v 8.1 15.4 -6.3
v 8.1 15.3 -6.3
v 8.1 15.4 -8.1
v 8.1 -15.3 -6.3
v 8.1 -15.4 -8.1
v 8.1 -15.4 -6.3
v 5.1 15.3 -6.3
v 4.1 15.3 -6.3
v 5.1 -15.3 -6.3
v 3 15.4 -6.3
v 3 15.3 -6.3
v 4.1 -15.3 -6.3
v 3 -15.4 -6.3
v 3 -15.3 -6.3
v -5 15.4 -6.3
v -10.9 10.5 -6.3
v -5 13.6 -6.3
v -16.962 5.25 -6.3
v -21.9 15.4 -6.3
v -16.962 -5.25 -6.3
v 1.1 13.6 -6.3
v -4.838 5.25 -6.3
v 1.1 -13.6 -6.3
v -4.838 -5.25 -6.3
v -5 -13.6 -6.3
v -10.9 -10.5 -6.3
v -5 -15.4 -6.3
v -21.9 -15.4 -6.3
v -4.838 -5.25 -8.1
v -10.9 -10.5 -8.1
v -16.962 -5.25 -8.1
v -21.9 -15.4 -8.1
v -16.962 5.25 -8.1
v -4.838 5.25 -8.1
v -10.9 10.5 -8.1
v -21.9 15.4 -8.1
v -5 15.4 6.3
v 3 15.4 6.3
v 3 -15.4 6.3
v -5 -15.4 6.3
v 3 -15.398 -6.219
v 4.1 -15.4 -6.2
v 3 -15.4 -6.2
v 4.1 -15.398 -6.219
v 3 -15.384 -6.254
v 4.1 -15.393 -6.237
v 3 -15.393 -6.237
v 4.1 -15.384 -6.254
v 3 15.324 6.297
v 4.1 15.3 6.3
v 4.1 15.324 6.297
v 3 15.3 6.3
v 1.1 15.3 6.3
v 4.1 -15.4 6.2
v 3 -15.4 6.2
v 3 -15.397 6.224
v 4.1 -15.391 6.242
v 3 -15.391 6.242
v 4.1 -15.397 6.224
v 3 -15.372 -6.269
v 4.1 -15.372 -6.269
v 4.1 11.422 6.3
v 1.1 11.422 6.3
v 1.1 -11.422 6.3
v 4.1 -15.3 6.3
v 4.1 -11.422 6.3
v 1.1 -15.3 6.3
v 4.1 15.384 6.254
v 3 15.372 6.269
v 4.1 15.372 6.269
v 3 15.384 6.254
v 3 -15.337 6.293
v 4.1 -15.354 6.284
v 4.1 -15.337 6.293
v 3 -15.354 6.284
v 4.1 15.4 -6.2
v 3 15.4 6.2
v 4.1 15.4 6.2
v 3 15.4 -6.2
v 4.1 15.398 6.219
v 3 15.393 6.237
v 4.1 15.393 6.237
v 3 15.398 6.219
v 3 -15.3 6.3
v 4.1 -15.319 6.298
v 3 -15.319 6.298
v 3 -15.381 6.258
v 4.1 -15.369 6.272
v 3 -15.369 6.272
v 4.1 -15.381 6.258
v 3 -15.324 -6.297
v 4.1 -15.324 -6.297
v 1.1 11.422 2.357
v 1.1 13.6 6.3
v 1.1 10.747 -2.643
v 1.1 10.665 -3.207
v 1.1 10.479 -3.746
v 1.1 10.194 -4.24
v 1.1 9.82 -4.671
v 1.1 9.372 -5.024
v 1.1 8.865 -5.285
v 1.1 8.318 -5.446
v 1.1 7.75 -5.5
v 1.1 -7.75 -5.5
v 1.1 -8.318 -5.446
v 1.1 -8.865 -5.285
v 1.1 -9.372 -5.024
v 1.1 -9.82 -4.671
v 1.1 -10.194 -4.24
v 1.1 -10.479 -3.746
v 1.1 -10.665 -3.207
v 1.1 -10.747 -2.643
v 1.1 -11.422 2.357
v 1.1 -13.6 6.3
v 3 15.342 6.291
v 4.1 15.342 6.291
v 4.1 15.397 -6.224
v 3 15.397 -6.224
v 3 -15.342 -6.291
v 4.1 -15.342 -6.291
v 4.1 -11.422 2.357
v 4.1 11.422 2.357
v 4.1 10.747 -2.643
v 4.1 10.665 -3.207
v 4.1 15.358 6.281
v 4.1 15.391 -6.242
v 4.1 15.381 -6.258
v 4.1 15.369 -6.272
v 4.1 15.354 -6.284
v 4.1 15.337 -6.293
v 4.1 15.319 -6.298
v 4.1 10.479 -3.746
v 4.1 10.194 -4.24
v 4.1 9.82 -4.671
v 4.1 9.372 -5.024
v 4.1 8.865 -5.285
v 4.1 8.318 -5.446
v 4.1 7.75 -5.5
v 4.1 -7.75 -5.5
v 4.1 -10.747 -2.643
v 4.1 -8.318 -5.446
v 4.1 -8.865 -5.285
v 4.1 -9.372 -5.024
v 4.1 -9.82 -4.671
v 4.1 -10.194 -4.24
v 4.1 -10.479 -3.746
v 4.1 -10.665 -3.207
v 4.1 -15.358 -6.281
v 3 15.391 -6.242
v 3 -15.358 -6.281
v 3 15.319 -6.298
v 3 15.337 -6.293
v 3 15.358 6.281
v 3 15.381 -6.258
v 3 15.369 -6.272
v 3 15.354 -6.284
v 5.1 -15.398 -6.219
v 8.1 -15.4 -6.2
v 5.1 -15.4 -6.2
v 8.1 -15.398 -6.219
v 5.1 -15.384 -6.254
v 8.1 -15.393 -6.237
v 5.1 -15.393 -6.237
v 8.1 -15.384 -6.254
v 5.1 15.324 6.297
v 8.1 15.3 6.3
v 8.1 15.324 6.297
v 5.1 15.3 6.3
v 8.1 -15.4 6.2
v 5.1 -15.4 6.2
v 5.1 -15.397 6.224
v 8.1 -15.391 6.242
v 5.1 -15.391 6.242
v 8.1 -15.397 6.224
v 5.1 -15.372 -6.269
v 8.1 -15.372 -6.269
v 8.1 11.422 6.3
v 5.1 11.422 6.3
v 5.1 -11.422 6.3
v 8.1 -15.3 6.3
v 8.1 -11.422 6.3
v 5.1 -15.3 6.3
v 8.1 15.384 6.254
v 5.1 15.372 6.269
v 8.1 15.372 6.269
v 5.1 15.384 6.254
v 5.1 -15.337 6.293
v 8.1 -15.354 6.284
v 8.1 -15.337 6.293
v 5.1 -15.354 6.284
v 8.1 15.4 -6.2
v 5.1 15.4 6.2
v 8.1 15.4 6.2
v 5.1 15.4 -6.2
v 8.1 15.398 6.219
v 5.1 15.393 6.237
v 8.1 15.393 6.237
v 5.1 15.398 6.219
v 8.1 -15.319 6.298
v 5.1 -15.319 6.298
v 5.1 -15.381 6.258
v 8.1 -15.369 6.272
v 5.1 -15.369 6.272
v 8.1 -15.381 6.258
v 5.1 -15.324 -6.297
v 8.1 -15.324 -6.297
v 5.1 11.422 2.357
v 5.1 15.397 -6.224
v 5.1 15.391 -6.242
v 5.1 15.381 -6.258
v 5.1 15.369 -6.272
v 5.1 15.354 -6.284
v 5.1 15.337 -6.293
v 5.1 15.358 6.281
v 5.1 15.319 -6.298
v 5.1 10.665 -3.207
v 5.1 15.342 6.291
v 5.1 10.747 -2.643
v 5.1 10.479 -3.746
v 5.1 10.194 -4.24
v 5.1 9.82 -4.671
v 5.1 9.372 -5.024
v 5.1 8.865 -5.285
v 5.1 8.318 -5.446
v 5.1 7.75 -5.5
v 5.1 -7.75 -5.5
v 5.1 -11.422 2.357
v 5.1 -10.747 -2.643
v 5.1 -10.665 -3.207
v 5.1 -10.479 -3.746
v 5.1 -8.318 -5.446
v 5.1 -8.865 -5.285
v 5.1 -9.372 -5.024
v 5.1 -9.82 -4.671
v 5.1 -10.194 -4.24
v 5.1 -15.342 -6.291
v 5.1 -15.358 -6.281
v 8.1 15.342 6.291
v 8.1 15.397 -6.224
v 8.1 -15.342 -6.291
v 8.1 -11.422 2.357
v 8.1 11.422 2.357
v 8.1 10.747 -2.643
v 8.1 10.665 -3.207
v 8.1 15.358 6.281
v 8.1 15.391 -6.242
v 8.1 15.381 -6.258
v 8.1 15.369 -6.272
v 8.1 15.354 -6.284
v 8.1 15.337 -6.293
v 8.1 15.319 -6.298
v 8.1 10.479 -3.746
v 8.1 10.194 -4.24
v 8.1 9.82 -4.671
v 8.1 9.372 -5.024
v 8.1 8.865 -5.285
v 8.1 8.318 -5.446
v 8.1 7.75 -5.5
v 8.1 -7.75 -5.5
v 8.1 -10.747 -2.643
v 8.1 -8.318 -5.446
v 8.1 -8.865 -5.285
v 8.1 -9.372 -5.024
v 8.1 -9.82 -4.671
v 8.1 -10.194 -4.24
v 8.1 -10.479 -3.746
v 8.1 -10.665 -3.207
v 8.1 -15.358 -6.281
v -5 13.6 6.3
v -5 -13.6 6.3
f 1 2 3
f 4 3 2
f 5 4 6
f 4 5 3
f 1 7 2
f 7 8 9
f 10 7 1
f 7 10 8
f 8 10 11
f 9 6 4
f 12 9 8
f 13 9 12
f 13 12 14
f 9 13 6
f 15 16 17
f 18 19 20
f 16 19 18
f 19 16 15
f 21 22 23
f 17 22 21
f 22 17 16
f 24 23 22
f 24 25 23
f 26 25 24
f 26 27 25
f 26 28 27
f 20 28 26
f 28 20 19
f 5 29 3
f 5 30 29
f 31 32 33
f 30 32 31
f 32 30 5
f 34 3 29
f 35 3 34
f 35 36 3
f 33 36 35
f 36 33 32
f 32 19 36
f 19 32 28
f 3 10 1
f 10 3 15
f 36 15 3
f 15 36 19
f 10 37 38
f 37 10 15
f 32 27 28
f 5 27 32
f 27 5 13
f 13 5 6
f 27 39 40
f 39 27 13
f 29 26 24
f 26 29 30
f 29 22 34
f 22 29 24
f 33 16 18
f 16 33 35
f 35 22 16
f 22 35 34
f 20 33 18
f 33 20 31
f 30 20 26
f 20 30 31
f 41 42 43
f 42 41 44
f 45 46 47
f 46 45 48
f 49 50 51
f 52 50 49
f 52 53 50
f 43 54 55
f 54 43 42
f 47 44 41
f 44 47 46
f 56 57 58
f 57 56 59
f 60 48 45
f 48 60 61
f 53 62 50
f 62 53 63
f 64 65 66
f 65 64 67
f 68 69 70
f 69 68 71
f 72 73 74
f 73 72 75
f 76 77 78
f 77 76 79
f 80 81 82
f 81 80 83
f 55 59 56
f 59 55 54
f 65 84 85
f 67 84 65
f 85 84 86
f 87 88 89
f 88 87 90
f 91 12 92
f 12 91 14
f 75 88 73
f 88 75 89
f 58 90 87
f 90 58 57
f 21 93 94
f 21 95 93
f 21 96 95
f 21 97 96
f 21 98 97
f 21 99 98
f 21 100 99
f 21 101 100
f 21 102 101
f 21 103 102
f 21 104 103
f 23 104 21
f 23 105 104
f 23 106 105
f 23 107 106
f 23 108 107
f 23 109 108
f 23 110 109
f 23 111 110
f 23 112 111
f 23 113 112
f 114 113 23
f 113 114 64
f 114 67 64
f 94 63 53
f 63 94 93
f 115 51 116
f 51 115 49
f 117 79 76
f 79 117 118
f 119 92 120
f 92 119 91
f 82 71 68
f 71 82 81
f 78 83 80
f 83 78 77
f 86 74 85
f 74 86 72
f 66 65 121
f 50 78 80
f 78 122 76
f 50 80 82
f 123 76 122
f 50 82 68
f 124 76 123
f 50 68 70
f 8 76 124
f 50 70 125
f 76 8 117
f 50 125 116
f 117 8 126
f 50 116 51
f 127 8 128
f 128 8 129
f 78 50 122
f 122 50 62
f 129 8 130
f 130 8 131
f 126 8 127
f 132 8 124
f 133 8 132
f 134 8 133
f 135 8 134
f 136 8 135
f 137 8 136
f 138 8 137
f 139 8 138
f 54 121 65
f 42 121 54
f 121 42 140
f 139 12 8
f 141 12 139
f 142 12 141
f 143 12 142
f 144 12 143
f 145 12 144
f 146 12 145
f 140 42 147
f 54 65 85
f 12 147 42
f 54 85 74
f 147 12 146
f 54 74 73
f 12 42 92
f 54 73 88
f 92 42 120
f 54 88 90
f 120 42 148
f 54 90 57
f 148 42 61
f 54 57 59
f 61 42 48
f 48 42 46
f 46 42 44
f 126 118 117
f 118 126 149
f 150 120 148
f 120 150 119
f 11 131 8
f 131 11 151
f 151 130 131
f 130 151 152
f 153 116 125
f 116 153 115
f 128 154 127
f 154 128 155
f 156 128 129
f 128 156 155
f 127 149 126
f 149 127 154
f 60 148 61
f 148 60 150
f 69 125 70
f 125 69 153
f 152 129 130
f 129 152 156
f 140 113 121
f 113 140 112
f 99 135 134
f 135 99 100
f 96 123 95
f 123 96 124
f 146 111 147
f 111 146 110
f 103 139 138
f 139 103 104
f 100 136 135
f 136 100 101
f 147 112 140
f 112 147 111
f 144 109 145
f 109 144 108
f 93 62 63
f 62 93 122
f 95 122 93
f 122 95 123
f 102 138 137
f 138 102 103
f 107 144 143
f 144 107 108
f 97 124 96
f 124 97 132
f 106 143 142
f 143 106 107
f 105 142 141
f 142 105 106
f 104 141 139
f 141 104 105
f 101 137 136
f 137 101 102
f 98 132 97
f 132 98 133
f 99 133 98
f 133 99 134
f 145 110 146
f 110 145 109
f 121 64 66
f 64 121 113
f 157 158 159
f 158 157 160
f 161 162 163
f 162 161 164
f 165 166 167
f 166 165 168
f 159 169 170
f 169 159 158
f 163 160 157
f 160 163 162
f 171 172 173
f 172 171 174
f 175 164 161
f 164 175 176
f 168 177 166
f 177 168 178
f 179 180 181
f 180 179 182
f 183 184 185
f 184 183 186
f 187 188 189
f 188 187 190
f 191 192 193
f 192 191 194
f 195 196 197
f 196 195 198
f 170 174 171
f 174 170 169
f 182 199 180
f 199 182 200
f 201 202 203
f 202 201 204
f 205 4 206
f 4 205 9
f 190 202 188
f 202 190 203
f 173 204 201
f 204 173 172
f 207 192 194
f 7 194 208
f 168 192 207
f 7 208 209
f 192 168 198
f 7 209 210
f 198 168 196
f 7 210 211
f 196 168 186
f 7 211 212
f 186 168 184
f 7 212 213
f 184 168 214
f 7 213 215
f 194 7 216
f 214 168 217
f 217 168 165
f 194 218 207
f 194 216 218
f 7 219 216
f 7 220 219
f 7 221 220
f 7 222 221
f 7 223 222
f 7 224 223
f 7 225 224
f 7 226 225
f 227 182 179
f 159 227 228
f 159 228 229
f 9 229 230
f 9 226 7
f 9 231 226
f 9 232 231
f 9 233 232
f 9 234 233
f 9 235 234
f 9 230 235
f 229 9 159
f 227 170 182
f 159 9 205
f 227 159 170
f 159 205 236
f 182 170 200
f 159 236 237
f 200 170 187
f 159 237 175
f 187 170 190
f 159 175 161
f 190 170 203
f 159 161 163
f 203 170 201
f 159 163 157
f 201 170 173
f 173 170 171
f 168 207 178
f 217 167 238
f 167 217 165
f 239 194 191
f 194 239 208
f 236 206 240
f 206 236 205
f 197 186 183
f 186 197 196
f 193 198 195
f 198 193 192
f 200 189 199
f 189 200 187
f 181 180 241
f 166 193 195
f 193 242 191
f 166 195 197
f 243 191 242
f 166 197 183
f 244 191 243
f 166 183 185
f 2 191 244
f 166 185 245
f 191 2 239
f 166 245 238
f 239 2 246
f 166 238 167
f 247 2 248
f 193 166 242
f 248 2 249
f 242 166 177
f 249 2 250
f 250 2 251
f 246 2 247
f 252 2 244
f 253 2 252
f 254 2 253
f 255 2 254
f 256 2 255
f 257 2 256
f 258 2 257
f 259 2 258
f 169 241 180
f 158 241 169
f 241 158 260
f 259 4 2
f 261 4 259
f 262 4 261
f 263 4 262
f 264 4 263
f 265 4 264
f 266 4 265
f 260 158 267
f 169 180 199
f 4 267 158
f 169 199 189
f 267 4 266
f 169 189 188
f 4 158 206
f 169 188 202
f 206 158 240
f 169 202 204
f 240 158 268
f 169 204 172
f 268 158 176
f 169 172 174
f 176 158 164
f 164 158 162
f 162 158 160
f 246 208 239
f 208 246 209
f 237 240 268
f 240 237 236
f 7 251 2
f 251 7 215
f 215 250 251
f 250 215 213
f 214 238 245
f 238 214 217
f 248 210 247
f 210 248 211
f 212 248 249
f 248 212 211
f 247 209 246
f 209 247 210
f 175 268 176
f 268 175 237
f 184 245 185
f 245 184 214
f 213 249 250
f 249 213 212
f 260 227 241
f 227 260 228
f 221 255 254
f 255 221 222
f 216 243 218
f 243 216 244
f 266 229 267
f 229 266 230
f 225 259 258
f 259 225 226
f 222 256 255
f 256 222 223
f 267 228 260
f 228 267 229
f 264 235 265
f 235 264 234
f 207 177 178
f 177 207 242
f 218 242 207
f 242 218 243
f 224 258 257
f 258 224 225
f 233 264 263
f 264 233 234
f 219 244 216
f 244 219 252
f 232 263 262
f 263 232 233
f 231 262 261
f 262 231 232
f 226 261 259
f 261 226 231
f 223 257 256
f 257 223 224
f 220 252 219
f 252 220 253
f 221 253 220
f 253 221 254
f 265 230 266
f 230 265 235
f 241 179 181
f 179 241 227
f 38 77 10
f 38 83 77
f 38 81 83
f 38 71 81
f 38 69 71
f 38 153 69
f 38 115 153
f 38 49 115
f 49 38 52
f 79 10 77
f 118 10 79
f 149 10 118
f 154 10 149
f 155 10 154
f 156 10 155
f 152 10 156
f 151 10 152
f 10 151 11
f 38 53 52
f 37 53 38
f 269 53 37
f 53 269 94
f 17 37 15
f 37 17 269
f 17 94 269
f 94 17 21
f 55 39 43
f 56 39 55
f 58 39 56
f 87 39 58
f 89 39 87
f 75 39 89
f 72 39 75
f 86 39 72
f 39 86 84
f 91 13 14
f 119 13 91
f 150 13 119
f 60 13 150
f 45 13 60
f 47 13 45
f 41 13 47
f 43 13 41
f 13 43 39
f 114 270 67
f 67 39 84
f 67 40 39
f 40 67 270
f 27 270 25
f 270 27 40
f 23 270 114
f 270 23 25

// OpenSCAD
// file: rounder.scad
// rounder.scad
// cutting tool for rounding off corners with a cylinder

//---------------------
module rounder(
r=10,   // radius
h=10,   // height
f=22,    // $fn
extra=0.01  // extra size for the cube
){

difference(){
  translate([-extra,-extra,-extra])
  cube([r+extra,r+extra,h+2*extra]);
  translate([r,r,-1])
  cylinder(r=r,h=h+2,$fn=f);
}

}

//---------------------------------------------------------------------------
module bevel(x=1,y=1,h=10){

linear_extrude(height=h)
polygon(points=[[0,0],[x,0],[0,y]]);
    
}
  

//========================

rounder();

//========================
// main file
//=================================================================================
// db9.scad
//
// Dr Tom Flint, 22 Oct 2023
//=================================================================================


use <../Parts/rounder.scad>
use <../Parts/threads.scad>

F1=33;

//----------------------------------------------------------------------------------
module dbplate(tol=0){
r1=1;
y1=25.3/2;

  difference(){
    linear_extrude(height=1+tol)  
    offset(r=r1,$fn=F1)
    square([12.6-2*r1,30.8-2*r1],center=true);

    if(tol==0){
      translate([0,y1,-1])
      cylinder(r=2.9/2,h=3,$fn=F1);
      translate([0,-y1,-1])
      cylinder(r=2.9/2,h=3,$fn=F1);
    }
  }
}

//----------------------------------------------------------------------------------
module dbmale(tol=0){

r2=3+tol;
y2=(17.85-r2)/2+tol;
y3=(16.5-r2)/2+tol;
y4=y2+1;
y5=y3+1;
  
  rotate([0,90,0])
  dbplate(tol=tol);
  
  // pin side
  hull(){
    translate([0,y2,2.5])
    rotate([0,90,0])
    cylinder(r=r2,h=5.8,$fn=F1);
    translate([0,-y2,2.5])
    rotate([0,90,0])
    cylinder(r=r2,h=5.8,$fn=F1);

    translate([0,y3,-2.5])
    rotate([0,90,0])
    cylinder(r=r2,h=5.8,$fn=F1);
    translate([0,-y3,-2.5])
    rotate([0,90,0])
    cylinder(r=r2,h=5.8,$fn=F1);
  }
  // wire lead side
  hull(){
    translate([-4,y4,2.5])
    rotate([0,90,0])
    cylinder(r=r2,h=4,$fn=F1);
    translate([-4,-y4,2.5])
    rotate([0,90,0])
    cylinder(r=r2,h=4,$fn=F1);

    translate([-4,y5,-2.5])
    rotate([0,90,0])
    cylinder(r=r2,h=4,$fn=F1);
    translate([-4,-y5,-2.5])
    rotate([0,90,0])
    cylinder(r=r2,h=4,$fn=F1);
  }
  // leads
  hull(){
    translate([-8,y4-3,1.5])
    rotate([0,90,0])
    cylinder(r=r2,h=4,$fn=F1);
    translate([-8,-y4+3,1.5])
    rotate([0,90,0])
    cylinder(r=r2,h=4,$fn=F1);

    translate([-8,y5-3,-1.5])
    rotate([0,90,0])
    cylinder(r=r2,h=4,$fn=F1);
    translate([-8,-y5+3,-1.5])
    rotate([0,90,0])
    cylinder(r=r2,h=4,$fn=F1);
  }

}

//----------------------------------------------------------------------------------
module dbfemale(){
}

//----------------------------------------------------------------------------------
module block1(tol=0){

r1=0.1;
y1=25.3/2;

r2=3+tol;
y2=(17.85-r2)/2+tol;
y3=(16.5-r2)/2+tol;
y4=y2+1;
y5=y3+1;

  translate([1.1,0,0])
  rotate([0,90,0])
  difference(){
    linear_extrude(height=3)  
    offset(r=r1,$fn=F1)
    square([12.6-2*r1,30.8-2*r1],center=true);

    //~ translate([0,y1,-1])
    //~ cylinder(r=2.9/2,h=6,$fn=F1);
    //~ translate([0,-y1,-1])
    //~ cylinder(r=2.9/2,h=6,$fn=F1);
    
    // wire lead side
    translate([0,0,2])
    rotate([0,-90,0])
    hull(){
      translate([-4,y4,2.5])
      rotate([0,90,0])
      cylinder(r=r2,h=8,$fn=F1);
      translate([-4,-y4,2.5])
      rotate([0,90,0])
      cylinder(r=r2,h=8,$fn=F1);

      translate([-4,y4,8])
      rotate([0,90,0])
      cylinder(r=r2,h=8,$fn=F1);
      translate([-4,-y4,8])
      rotate([0,90,0])
      cylinder(r=r2,h=8,$fn=F1);

      translate([-4,y5,-2.5])
      rotate([0,90,0])
      cylinder(r=r2,h=8,$fn=F1);
      translate([-4,-y5,-2.5])
      rotate([0,90,0])
      cylinder(r=r2,h=8,$fn=F1);
    }

  }

}

//=================================================================================

//dbplate();
//dbmale(tol=0);
//dbfemale();

translate([4-5,30.8/2-1.8/2,0])
cube([8,1.8,12.6],center=true);
translate([4-5,-(30.8/2-1.8/2),0])
cube([8,1.8,12.6],center=true);

difference(){
  translate([4-5.9-5,0,-12.6/2-1.8/2])
  cube([30,30.8,1.8],center=true);
  translate([4-5.9-9,0,-12.6/2-1.8/2])
  scale([1,1.5,1])
  rotate([0,0,30])
  cylinder(r=7,h=10,$fn=6,center=true);
}

block1();
translate([4,0,0])
block1();

//=================================================================================
